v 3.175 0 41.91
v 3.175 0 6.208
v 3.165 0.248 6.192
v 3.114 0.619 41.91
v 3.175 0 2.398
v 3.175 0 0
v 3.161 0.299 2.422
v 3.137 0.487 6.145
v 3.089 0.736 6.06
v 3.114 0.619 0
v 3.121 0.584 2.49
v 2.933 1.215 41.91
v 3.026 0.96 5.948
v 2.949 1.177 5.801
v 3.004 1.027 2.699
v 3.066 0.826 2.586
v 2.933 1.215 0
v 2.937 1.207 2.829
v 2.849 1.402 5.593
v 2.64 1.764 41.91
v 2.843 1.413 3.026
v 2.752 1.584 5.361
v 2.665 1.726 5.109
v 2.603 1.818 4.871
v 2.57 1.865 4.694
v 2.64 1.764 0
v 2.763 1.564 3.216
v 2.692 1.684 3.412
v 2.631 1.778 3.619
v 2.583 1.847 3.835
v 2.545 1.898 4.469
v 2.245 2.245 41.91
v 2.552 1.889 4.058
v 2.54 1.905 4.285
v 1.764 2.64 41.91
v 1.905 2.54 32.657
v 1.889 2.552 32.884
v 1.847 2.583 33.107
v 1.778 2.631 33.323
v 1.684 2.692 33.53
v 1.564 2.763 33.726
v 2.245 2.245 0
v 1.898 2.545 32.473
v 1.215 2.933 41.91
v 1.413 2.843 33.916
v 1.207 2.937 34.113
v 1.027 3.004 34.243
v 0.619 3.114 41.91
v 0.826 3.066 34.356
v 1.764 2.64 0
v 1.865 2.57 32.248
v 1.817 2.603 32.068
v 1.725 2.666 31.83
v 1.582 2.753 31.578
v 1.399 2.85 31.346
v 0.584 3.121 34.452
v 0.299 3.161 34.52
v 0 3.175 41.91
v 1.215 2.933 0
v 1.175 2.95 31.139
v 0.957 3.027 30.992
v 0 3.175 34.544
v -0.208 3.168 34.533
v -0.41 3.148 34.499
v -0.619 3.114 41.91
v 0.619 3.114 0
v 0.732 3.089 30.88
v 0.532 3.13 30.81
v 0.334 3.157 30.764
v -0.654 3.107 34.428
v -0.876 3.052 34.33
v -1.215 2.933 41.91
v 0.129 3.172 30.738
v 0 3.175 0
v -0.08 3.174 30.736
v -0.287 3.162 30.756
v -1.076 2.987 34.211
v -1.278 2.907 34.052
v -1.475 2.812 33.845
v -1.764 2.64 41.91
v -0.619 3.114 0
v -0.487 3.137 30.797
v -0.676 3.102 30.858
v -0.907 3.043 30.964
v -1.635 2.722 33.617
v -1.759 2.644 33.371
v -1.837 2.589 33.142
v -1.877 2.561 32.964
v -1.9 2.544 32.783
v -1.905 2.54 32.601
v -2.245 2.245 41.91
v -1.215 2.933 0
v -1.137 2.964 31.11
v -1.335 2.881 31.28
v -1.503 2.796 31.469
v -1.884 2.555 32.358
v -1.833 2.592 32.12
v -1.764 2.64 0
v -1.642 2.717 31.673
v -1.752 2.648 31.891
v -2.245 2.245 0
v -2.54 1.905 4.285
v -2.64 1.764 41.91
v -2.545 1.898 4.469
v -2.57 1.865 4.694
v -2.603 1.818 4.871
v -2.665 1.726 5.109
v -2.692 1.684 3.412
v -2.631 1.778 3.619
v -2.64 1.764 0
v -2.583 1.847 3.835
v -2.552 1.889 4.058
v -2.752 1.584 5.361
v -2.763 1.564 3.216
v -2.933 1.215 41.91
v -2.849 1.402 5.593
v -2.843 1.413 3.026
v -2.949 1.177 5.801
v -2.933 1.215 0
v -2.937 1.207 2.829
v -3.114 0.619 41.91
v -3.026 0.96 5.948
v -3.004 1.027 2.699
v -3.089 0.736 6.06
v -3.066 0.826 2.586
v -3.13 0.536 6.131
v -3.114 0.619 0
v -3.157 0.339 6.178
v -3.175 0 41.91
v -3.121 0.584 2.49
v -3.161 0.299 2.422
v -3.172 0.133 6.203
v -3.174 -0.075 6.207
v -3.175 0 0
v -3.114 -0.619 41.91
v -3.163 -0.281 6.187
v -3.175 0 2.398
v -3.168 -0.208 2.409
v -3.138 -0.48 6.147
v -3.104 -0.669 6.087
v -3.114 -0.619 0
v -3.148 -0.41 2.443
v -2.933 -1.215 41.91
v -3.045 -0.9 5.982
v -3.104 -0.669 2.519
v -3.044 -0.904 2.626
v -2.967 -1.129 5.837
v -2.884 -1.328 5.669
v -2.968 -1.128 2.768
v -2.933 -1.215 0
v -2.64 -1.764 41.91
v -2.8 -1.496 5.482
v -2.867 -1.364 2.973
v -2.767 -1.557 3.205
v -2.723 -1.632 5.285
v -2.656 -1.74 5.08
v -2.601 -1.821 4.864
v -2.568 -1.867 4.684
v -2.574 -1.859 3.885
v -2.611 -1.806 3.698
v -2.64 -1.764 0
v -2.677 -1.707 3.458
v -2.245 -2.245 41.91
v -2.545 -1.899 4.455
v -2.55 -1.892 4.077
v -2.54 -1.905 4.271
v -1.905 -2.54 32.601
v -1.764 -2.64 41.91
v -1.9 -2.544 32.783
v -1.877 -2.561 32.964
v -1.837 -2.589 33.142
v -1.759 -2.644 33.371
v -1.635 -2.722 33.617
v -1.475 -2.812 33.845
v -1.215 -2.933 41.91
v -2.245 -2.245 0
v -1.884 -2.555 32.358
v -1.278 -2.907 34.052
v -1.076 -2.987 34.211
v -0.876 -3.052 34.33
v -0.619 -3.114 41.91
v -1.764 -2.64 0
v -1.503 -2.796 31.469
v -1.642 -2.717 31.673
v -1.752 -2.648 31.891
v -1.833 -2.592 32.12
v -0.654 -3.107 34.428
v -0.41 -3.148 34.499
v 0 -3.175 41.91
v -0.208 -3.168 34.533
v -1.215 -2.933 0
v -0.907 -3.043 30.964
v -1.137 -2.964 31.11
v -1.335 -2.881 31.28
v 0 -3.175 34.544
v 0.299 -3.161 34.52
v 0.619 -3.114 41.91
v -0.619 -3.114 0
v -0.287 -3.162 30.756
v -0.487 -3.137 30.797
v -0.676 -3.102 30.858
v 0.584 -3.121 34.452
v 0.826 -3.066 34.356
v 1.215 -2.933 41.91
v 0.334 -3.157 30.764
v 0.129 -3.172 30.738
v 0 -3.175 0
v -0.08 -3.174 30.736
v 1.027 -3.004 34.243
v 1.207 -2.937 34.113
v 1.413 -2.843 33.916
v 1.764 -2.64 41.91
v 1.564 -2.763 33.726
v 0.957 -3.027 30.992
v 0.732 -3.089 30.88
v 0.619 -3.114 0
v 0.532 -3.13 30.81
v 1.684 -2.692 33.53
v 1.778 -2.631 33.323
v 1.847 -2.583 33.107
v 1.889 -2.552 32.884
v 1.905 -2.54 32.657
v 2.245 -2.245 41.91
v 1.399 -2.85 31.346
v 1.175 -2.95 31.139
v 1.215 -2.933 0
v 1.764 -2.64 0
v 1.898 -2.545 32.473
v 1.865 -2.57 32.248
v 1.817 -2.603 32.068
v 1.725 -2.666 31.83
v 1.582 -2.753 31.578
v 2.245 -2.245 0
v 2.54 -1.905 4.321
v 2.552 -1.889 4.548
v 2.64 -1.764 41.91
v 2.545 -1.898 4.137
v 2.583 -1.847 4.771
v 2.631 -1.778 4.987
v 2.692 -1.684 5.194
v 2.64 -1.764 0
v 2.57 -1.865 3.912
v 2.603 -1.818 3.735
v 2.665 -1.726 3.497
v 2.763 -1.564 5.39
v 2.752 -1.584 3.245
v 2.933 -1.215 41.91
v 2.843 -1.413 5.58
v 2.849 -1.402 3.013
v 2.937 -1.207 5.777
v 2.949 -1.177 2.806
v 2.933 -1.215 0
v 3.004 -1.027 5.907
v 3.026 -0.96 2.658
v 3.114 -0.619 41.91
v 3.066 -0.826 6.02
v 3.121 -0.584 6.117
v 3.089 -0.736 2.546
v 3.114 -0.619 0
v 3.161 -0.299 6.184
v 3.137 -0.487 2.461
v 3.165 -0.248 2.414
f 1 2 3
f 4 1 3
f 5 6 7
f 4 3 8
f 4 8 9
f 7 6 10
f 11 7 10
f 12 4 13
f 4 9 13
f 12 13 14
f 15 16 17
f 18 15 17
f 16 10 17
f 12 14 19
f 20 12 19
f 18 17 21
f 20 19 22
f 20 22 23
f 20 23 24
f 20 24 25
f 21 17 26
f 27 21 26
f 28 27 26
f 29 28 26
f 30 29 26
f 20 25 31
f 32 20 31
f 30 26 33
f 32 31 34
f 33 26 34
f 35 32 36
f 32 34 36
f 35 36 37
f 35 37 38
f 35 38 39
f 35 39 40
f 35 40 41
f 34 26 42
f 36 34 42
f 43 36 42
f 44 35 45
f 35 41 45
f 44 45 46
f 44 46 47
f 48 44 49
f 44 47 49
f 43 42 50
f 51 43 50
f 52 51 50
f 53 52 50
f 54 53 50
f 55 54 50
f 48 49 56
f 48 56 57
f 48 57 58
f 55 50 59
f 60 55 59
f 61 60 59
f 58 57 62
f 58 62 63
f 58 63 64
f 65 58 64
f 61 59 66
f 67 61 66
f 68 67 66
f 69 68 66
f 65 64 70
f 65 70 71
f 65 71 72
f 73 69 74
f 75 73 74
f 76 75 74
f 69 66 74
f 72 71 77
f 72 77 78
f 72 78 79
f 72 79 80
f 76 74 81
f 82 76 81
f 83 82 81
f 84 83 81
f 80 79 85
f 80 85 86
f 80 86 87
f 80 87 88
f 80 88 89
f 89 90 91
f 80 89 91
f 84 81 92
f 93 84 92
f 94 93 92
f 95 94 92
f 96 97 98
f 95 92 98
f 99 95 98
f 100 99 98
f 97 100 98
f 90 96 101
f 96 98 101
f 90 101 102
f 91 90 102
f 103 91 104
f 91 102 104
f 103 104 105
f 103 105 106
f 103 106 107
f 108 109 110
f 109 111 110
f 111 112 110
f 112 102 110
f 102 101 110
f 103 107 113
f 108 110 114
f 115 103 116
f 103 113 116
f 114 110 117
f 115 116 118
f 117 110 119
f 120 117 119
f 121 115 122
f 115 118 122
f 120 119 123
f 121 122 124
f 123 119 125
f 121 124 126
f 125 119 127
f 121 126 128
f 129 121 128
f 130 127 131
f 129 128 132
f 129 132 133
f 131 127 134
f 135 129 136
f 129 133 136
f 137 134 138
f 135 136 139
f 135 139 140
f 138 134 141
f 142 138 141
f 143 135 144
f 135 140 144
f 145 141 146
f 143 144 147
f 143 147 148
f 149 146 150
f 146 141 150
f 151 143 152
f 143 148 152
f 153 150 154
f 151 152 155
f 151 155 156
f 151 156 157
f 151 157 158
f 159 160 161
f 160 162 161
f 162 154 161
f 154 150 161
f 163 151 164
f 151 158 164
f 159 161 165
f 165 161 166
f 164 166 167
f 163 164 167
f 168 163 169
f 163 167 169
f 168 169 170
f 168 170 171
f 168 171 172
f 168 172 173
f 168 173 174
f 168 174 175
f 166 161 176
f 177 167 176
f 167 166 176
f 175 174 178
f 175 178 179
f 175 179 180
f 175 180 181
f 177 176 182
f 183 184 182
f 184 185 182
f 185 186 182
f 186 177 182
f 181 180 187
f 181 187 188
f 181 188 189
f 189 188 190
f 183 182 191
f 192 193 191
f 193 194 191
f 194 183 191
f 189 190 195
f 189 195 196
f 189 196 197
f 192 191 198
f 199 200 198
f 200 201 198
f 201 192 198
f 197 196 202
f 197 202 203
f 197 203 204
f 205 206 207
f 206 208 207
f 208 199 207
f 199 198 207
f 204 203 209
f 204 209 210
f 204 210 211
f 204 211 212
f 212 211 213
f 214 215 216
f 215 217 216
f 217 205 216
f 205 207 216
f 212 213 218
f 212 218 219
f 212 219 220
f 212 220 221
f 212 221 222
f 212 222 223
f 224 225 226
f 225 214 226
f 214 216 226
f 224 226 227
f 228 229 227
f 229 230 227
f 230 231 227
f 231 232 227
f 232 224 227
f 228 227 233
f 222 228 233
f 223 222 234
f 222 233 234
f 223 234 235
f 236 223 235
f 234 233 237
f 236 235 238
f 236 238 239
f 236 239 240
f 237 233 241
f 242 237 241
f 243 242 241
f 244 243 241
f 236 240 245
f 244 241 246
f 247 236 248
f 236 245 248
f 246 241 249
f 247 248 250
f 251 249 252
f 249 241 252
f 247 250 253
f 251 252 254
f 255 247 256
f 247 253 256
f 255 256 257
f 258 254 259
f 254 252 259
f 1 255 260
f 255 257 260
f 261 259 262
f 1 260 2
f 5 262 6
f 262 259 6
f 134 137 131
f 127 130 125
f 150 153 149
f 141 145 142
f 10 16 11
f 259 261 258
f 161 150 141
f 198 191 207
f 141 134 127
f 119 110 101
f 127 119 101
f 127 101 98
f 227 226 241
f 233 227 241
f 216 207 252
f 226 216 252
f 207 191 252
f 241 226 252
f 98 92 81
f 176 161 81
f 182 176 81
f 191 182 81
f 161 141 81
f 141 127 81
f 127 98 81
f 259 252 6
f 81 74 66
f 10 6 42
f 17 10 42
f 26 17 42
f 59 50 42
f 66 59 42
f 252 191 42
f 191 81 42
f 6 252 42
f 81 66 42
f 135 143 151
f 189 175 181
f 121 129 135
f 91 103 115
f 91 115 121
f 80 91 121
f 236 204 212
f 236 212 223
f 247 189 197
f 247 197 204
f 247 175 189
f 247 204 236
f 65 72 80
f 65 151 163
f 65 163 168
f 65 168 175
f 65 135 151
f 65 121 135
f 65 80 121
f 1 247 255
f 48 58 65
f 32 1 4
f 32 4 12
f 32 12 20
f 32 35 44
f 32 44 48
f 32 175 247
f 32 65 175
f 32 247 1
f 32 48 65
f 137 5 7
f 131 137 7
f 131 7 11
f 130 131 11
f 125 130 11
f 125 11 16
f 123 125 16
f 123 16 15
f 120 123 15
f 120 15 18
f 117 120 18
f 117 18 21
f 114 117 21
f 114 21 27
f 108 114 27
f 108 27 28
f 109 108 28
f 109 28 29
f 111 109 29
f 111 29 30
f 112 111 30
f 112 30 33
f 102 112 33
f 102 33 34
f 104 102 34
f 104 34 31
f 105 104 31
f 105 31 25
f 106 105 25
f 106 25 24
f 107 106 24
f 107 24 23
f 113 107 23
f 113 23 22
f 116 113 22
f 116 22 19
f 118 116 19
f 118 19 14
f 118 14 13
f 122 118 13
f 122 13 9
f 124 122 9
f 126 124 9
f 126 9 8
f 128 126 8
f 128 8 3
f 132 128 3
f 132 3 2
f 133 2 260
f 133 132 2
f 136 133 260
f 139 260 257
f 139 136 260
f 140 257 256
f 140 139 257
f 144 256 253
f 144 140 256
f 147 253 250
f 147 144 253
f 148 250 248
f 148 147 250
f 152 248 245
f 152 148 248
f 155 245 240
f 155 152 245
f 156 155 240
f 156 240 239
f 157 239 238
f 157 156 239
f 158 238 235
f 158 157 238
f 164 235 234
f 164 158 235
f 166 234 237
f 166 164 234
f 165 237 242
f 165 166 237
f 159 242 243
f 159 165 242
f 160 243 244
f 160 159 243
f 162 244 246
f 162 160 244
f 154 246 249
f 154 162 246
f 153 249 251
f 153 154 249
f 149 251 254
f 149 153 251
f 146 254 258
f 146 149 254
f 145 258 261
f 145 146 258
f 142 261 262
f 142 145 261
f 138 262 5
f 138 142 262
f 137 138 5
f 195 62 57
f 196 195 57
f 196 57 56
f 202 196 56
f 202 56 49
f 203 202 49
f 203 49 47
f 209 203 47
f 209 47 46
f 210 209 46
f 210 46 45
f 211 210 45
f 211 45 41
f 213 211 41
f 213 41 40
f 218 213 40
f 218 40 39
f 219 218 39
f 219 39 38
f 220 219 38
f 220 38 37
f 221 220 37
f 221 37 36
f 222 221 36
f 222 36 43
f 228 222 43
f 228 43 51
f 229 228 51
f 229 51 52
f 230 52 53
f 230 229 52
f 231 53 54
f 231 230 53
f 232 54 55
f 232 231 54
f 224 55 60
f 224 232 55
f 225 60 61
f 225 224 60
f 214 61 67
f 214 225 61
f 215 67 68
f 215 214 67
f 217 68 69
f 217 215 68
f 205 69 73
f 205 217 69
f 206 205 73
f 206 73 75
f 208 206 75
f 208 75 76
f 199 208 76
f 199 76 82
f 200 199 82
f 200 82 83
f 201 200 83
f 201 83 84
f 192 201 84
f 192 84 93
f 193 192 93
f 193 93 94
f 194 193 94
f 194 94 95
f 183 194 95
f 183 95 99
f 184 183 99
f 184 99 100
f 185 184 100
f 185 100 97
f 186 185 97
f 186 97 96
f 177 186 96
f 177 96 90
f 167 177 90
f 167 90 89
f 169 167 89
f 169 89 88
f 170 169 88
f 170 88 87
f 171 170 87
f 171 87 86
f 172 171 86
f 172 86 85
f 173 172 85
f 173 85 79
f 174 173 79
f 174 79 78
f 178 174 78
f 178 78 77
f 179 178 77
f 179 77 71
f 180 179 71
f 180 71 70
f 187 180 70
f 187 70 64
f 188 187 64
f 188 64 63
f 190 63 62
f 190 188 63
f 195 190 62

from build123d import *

# Parameters (mm, degrees)
SKETCH1_R               = 3.175
BOSS_EXTRUDE1_DEPTH     = 41.91
CUT_EXTRUDE1_DEPTH      = 43.149844009
CUT_EXTRUDE1_DEPTH_BACK = 43.149844009
SKETCH2_R               = 1.905
CUT_EXTRUDE2_DEPTH      = 43.149844124
CUT_EXTRUDE2_DEPTH_BACK = 43.149844124
SKETCH3_R               = 1.905


with BuildPart() as part:
    # Sketch1 → Boss-Extrude1 (new body)
    with BuildSketch(Plane.XY):
        Circle(SKETCH1_R)
    extrude(amount=BOSS_EXTRUDE1_DEPTH)

    # Sketch2 → Cut-Extrude1 (cut, two sides: drawn at the far end of the back side and taken through both)
    with BuildSketch(Plane(origin=(0, 0, 0), x_dir=(1, 0, 0), z_dir=(0, 1, 0)).offset(-CUT_EXTRUDE1_DEPTH_BACK)):
        with Locations(Location((0, -32.639, 0), (0, 0, 270))):
            Circle(SKETCH2_R)
    extrude(amount=CUT_EXTRUDE1_DEPTH + CUT_EXTRUDE1_DEPTH_BACK, mode=Mode.SUBTRACT)

    # Sketch3 → Cut-Extrude2 (cut, two sides: drawn at the far end of the back side and taken through both)
    with BuildSketch(Plane(origin=(0, 0, 0), x_dir=(0, 0, -1), z_dir=(1, 0, 0)).offset(-CUT_EXTRUDE2_DEPTH_BACK)):
        with Locations((-4.303139223, 0)):
            Circle(SKETCH3_R)
    extrude(amount=CUT_EXTRUDE2_DEPTH + CUT_EXTRUDE2_DEPTH_BACK, mode=Mode.SUBTRACT)


solid = part.part
